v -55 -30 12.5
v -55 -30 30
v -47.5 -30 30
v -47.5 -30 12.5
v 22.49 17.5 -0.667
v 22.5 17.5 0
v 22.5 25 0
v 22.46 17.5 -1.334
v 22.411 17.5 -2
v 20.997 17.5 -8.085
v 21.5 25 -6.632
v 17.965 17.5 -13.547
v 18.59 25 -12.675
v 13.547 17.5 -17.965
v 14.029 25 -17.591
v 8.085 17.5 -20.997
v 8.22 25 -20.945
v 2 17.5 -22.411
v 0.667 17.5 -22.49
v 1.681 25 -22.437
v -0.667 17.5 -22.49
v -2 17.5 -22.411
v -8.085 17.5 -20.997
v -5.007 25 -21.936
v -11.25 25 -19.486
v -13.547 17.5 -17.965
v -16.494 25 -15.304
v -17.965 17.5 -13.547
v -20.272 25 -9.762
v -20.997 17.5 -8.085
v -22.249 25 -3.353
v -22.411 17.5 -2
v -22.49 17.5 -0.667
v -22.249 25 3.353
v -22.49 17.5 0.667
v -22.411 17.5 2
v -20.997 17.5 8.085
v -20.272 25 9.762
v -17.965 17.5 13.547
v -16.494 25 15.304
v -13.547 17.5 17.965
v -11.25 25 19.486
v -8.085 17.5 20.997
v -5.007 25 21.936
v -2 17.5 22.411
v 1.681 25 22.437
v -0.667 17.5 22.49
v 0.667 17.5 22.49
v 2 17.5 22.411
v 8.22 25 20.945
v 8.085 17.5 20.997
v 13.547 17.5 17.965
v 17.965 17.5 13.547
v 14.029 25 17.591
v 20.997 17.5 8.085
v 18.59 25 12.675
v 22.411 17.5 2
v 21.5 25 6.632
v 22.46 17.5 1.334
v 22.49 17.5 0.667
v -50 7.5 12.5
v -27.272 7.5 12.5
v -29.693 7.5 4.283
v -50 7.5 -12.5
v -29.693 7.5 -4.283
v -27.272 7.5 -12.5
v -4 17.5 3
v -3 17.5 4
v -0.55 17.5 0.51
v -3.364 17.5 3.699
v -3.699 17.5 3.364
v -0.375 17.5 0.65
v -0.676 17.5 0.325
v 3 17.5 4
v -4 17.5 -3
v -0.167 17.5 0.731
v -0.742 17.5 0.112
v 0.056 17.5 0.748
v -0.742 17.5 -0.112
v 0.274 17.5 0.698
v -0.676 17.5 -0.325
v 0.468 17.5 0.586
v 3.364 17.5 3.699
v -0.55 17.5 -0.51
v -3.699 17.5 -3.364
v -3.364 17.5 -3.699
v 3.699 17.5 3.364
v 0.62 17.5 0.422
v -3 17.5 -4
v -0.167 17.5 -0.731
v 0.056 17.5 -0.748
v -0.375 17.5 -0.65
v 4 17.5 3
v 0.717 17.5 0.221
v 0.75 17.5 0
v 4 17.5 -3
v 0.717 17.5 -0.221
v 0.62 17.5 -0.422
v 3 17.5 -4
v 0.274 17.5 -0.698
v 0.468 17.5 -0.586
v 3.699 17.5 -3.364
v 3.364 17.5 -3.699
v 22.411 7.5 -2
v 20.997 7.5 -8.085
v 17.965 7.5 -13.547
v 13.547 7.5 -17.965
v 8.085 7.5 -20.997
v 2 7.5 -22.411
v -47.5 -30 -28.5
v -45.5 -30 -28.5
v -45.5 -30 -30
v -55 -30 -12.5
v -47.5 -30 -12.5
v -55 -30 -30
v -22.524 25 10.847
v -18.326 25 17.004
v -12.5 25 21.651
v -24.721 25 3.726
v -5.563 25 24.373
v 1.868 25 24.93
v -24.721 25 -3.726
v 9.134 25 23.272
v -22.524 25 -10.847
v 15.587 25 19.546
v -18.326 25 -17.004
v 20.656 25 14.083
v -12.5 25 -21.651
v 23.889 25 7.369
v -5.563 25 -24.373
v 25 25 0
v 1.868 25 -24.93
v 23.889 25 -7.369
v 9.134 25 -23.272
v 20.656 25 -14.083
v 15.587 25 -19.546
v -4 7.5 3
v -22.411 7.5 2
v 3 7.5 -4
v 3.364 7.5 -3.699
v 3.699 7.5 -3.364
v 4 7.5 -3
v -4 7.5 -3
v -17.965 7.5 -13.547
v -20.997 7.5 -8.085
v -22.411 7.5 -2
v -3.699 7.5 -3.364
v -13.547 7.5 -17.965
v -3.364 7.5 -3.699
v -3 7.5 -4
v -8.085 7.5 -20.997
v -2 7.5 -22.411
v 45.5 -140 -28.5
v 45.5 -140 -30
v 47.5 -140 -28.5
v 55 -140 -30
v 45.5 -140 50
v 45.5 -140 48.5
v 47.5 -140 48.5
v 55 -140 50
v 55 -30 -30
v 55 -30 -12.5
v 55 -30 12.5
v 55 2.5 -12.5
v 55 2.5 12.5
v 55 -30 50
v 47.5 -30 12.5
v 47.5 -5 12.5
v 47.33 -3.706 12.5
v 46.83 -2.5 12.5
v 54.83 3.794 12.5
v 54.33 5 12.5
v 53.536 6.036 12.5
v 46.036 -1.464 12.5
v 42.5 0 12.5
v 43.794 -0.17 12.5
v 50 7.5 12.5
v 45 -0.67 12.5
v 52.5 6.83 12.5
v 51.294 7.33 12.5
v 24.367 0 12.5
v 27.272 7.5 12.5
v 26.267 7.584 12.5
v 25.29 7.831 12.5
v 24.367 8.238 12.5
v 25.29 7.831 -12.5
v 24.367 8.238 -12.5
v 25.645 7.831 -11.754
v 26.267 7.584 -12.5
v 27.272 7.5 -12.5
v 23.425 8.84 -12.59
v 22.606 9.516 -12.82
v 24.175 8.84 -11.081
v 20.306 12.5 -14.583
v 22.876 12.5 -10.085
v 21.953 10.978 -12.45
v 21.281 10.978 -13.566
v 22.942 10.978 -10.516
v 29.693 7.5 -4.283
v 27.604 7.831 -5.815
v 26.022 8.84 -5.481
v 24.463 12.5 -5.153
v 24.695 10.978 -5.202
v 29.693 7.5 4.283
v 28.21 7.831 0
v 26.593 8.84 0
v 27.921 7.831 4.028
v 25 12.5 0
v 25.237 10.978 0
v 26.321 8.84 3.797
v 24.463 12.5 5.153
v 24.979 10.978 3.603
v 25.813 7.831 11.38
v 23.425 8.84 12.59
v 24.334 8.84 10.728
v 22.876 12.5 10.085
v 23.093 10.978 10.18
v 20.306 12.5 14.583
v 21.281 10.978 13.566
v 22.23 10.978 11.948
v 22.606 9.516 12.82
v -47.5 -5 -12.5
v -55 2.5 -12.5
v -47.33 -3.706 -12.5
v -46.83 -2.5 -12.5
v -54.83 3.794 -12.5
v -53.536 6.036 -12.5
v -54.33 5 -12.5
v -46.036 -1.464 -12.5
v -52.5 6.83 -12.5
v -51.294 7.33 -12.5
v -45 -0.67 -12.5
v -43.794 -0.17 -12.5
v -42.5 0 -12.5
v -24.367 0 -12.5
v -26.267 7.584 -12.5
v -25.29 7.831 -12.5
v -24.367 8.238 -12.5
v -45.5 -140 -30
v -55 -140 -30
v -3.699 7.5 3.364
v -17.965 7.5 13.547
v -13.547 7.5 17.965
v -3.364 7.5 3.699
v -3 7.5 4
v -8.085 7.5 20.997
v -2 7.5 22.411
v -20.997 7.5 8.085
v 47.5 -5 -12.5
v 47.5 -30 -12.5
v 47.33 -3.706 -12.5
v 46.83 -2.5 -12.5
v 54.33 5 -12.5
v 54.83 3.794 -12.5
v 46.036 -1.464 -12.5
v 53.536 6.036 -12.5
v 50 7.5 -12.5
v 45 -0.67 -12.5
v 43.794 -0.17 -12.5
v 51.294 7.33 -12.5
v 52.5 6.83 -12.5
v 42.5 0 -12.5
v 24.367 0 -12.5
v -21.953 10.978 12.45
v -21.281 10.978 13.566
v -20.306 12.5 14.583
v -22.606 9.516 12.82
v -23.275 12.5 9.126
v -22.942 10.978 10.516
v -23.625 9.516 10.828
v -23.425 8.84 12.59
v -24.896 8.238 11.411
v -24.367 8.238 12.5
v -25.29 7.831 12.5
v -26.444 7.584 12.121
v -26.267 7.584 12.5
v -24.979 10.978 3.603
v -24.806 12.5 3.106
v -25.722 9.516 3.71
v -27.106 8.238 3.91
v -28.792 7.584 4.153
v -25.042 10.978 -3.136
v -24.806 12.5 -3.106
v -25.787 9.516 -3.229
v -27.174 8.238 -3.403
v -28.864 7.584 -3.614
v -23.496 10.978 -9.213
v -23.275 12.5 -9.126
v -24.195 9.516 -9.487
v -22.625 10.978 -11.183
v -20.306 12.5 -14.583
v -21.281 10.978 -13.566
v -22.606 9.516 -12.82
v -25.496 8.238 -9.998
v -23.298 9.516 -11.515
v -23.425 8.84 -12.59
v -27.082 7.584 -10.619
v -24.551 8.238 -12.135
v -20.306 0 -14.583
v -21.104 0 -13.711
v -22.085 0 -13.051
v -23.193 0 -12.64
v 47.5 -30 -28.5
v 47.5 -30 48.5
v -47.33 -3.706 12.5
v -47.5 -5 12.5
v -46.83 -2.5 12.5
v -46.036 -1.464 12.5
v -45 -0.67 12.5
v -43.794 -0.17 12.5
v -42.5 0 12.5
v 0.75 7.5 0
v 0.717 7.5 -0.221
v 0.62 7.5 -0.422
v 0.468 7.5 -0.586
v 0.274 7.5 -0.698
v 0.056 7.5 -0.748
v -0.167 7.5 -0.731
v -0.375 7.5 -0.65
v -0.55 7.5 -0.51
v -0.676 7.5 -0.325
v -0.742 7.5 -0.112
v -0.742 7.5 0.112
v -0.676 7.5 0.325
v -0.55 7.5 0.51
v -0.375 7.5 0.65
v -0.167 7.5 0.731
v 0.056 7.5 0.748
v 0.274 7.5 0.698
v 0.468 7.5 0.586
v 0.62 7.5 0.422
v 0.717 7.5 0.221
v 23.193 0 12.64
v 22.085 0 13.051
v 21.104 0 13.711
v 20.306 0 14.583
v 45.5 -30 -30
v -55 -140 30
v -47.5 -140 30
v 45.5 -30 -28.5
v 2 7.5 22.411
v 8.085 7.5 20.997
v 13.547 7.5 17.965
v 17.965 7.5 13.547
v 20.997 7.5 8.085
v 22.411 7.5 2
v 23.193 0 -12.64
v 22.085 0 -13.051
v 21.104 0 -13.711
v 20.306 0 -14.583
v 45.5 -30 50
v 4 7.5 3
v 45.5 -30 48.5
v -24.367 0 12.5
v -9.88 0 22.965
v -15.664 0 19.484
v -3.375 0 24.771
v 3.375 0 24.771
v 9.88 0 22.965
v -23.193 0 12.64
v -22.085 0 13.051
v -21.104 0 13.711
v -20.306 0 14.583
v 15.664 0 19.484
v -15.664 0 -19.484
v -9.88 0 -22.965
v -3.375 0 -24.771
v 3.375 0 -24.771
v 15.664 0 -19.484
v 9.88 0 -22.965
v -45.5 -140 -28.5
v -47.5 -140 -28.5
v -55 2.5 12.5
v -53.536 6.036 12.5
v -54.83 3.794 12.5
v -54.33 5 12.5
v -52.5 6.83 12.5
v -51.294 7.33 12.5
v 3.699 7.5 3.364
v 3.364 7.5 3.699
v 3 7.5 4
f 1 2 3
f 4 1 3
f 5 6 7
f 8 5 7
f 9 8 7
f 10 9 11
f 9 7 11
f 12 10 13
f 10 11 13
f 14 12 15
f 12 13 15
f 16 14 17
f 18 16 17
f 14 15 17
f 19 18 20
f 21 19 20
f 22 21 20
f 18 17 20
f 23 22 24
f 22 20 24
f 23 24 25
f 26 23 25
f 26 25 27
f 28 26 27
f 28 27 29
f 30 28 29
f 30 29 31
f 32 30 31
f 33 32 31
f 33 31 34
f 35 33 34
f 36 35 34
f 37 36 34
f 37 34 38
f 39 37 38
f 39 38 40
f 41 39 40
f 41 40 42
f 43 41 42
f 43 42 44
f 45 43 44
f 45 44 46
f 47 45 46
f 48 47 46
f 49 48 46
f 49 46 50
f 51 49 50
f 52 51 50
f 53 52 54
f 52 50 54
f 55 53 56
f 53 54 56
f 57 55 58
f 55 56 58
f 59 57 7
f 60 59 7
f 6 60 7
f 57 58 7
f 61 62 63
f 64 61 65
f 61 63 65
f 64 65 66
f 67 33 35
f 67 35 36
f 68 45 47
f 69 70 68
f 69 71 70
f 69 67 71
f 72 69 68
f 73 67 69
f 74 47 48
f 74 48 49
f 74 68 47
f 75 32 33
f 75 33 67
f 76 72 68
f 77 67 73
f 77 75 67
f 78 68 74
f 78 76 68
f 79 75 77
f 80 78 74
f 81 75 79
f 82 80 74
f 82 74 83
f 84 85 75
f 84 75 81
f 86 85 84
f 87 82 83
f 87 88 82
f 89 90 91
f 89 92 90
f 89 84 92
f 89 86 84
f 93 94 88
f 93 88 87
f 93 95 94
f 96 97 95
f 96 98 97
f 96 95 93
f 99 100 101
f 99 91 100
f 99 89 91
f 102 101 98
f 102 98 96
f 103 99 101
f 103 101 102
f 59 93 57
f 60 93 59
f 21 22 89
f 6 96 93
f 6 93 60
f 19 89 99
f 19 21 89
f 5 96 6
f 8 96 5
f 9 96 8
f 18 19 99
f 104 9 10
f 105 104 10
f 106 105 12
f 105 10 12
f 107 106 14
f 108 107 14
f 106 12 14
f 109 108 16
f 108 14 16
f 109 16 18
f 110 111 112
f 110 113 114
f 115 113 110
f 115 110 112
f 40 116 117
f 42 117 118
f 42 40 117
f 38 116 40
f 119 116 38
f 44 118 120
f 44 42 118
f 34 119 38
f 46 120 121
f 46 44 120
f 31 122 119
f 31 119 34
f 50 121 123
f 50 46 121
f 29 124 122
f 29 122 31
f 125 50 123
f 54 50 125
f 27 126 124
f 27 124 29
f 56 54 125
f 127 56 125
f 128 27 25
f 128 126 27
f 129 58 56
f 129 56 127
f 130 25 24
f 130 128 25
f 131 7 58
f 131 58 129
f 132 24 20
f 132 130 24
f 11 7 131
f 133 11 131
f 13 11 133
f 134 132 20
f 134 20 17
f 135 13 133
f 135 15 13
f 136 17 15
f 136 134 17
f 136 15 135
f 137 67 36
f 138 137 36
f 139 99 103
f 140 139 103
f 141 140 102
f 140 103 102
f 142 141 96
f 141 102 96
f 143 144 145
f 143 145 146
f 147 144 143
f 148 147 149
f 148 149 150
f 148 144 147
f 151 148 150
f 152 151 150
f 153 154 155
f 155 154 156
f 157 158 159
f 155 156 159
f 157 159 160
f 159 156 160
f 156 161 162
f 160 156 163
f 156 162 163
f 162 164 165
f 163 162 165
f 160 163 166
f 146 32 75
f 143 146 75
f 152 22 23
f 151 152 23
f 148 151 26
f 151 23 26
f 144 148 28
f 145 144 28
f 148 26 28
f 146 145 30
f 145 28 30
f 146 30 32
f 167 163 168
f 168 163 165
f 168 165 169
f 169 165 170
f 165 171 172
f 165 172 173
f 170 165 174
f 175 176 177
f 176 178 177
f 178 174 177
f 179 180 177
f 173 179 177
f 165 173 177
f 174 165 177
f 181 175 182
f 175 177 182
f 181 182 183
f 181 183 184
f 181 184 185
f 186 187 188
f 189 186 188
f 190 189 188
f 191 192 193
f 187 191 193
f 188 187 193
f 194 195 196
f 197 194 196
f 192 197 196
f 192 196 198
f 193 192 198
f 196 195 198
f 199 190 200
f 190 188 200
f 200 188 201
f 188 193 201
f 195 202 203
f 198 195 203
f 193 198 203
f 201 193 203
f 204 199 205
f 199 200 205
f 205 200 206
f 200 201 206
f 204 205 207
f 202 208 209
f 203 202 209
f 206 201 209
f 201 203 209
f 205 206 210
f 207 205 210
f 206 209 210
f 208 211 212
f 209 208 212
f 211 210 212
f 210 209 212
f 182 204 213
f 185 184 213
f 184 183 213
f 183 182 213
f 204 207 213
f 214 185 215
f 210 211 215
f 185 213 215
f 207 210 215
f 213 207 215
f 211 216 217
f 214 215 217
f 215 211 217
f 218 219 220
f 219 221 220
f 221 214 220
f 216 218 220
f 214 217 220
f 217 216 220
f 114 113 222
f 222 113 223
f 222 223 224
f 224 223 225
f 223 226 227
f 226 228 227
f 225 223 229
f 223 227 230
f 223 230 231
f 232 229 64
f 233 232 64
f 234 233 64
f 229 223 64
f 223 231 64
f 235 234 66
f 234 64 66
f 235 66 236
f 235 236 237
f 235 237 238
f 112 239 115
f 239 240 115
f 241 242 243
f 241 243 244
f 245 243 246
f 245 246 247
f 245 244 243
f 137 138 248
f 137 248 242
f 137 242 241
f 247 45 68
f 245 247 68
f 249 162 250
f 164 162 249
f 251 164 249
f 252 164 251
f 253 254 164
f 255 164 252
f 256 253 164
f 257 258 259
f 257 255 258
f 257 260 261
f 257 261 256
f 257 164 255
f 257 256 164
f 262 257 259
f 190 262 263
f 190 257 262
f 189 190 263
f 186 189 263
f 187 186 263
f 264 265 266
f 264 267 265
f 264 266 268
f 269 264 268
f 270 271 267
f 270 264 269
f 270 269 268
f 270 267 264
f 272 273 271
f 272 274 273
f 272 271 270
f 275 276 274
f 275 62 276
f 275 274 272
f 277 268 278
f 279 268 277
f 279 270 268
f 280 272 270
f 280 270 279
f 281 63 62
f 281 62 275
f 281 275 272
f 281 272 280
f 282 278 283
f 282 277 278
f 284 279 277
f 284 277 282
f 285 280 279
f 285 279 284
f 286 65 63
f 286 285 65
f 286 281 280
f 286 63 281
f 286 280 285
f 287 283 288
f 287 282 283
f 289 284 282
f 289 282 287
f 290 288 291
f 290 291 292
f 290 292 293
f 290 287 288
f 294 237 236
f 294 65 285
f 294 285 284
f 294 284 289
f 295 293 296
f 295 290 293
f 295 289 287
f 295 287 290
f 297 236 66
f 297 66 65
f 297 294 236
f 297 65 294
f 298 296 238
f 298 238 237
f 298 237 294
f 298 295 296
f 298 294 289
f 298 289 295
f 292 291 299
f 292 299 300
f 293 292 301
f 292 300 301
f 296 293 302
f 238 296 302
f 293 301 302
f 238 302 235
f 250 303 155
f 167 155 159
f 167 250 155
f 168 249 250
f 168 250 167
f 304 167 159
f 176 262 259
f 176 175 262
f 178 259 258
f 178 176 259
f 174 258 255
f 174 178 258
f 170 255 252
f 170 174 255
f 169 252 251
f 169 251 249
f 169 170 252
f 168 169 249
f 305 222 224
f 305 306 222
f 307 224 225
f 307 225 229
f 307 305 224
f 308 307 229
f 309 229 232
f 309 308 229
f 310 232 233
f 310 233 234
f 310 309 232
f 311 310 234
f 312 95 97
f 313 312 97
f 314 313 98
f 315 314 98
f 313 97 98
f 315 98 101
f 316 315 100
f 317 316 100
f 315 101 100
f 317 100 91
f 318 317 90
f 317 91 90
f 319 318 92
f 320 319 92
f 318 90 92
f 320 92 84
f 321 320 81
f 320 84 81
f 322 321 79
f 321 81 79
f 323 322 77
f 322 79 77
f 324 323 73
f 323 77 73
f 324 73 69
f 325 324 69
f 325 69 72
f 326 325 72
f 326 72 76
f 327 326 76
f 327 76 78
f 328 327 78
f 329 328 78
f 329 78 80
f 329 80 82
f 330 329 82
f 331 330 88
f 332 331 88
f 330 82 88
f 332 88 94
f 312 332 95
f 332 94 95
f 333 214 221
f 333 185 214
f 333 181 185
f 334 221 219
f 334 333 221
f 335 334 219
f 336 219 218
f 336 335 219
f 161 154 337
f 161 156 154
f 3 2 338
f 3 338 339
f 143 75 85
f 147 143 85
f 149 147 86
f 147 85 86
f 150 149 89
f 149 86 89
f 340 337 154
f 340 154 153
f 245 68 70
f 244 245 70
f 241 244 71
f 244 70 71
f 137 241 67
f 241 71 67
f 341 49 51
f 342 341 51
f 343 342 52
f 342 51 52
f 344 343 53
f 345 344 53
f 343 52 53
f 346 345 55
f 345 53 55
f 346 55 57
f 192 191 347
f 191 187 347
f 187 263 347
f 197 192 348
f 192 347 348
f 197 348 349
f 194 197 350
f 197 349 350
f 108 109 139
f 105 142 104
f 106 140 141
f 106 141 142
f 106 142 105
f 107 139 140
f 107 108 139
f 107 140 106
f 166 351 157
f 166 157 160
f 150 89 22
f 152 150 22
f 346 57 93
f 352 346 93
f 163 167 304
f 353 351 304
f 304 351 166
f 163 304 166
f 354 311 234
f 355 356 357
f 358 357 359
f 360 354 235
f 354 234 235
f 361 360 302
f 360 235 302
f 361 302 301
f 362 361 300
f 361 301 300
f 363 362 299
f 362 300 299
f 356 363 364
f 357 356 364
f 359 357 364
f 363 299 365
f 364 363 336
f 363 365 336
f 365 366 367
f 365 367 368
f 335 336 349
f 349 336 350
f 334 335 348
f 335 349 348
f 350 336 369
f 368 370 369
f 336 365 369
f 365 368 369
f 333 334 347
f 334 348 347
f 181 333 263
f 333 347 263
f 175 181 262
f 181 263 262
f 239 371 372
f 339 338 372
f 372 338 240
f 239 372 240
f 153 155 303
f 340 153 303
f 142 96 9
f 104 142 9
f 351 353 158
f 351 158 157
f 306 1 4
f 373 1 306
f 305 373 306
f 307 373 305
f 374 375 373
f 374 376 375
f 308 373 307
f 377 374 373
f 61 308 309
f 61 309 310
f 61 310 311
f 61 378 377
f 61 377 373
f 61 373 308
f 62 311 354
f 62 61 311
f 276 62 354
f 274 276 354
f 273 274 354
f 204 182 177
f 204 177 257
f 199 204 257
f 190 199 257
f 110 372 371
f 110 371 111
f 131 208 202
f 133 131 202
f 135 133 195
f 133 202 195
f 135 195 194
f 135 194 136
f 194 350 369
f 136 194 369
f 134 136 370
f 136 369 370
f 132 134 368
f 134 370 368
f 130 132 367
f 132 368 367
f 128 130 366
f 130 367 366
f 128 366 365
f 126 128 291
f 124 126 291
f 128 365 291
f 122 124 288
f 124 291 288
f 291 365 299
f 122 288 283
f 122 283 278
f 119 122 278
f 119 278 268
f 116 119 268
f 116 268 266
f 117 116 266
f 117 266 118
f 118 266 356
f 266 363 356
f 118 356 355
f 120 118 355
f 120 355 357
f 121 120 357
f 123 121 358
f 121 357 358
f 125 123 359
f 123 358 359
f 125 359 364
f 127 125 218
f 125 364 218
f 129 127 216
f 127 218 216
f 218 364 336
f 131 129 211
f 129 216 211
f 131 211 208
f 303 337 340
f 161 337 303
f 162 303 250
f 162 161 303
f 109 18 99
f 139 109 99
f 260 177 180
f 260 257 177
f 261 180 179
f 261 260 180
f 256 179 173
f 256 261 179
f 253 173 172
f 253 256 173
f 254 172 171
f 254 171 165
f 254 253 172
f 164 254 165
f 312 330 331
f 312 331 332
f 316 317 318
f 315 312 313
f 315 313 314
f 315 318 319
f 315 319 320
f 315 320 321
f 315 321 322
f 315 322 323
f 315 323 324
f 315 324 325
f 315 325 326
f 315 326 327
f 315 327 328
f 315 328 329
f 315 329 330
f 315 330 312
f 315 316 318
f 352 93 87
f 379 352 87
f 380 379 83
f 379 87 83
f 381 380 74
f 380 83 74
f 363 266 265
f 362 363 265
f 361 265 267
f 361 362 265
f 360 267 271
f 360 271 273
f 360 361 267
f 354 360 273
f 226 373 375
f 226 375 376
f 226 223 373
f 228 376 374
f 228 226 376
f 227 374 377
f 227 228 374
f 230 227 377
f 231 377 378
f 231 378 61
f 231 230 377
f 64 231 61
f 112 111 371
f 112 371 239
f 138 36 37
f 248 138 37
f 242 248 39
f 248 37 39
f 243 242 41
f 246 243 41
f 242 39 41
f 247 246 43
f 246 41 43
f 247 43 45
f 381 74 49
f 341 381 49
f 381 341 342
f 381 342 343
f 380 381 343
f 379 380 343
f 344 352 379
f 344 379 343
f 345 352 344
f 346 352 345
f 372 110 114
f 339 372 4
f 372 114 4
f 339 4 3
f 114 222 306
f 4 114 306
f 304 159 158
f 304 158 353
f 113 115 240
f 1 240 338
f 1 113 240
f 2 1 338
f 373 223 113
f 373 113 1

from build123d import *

# Parameters (mm, degrees)
SKETCH1_R                = 25
BOSS_EXTRUDE1_DEPTH      = 25
BOSS_EXTRUDE3_DEPTH      = 55
BOSS_EXTRUDE3_DEPTH_BACK = 55
SKETCH9_W                = 25
SKETCH9_H                = 7.5
SKETCH16_R               = 22.5
CUT_EXTRUDE3_DEPTH       = 7.5
SKETCH17_R               = 0.75
CUT_EXTRUDE4_DEPTH       = 10
SKETCH22_W               = 7.5
SKETCH22_H               = 25
BOSS_EXTRUDE7_DEPTH      = 30
SKETCH23_W               = 7.5
SKETCH23_H               = 60
BOSS_EXTRUDE8_DEPTH      = 110
SKETCH24_W               = 7.5
SKETCH24_H               = 80
BOSS_EXTRUDE9_DEPTH      = 110
SKETCH25_W               = 1.5
SKETCH25_H               = 110
BOSS_EXTRUDE10_DEPTH     = 2
SKETCH26_W               = 1.5
SKETCH26_H               = 110
BOSS_EXTRUDE11_DEPTH     = 2
FILLET6_R                = 5


with BuildPart() as part:
    # Sketch1 → Boss-Extrude1 (new body)
    with BuildSketch(Plane(origin=(0, 0, 0), x_dir=(1, 0, 0), z_dir=(0, 1, 0))):
        Circle(SKETCH1_R)
    extrude(amount=BOSS_EXTRUDE1_DEPTH)

    # Sketch9 → Boss-Extrude3 (add, two sides: drawn at the far end of the back side and taken through both)
    with BuildSketch(Plane(origin=(0, 0, 0), x_dir=(0, 0, -1), z_dir=(1, 0, 0)).offset(-BOSS_EXTRUDE3_DEPTH_BACK)):
        with Locations((0, 3.75)):
            Rectangle(SKETCH9_W, SKETCH9_H)
    extrude(amount=BOSS_EXTRUDE3_DEPTH + BOSS_EXTRUDE3_DEPTH_BACK)

    # Sketch16 → Cut-Extrude3 (cut)
    with BuildSketch(Plane(origin=(0, 25, 0), x_dir=(1, 0, 0), z_dir=(0, 1, 0))):
        Circle(SKETCH16_R)
    extrude(amount=-CUT_EXTRUDE3_DEPTH, mode=Mode.SUBTRACT)

    # Sketch17 → Cut-Extrude4 (cut)
    with BuildSketch(Plane(origin=(0, 17.5, 0), x_dir=(1, 0, 0), z_dir=(0, 1, 0))):
        with BuildLine():
            ThreePointArc((-4, 3), (-3.535533906, 3.535533906), (-3, 4))
            Line((-3, 4), (-2, 22.410934831))
            ThreePointArc((-2, 22.410934831), (-15.909902577, 15.909902577), (-22.410934831, 2))
            Line((-22.410934831, 2), (-4, 3))
        make_face()
        Circle(SKETCH17_R)
        with BuildLine():
            ThreePointArc((22.410934831, 2), (15.909902577, 15.909902577), (2, 22.410934831))
            Line((2, 22.410934831), (3, 4))
            ThreePointArc((3, 4), (3.535533906, 3.535533906), (4, 3))
            Line((4, 3), (22.410934831, 2))
        make_face()
        with BuildLine():
            ThreePointArc((-3, -4), (-3.535533906, -3.535533906), (-4, -3))
            Line((-4, -3), (-22.410934831, -2))
            ThreePointArc((-22.410934831, -2), (-15.909902577, -15.909902577), (-2, -22.410934831))
            Line((-2, -22.410934831), (-3, -4))
        make_face()
        with BuildLine():
            ThreePointArc((4, -3), (3.535533906, -3.535533906), (3, -4))
            Line((3, -4), (2, -22.410934831))
            ThreePointArc((2, -22.410934831), (15.909902577, -15.909902577), (22.410934831, -2))
            Line((22.410934831, -2), (4, -3))
        make_face()
    extrude(amount=-CUT_EXTRUDE4_DEPTH, mode=Mode.SUBTRACT)

    # Sketch22 → Boss-Extrude7 (add)
    with BuildSketch(Plane.XZ):
        with Locations((-51.25, 0)):
            Rectangle(SKETCH22_W, SKETCH22_H)
    boss_extrude7 = extrude(amount=BOSS_EXTRUDE7_DEPTH)

    # Sketch23 → Boss-Extrude8 (add)
    with BuildSketch(Plane.XZ.offset(30)):
        with Locations((-51.25, 0)):
            Rectangle(SKETCH23_W, SKETCH23_H)
    extrude(amount=BOSS_EXTRUDE8_DEPTH)

    # Mirror1: Boss-Extrude7 across plane
    add(boss_extrude7.mirror(Plane(origin=(0, 0, 0), x_dir=(0, 0, 1), z_dir=(1, 0, 0))))

    # Sketch24 → Boss-Extrude9 (add)
    with BuildSketch(Plane.XZ.offset(30)):
        with Locations((51.25, 10)):
            Rectangle(SKETCH24_W, SKETCH24_H)
    extrude(amount=BOSS_EXTRUDE9_DEPTH)

    # Sketch25 → Boss-Extrude10 (add)
    with BuildSketch(Plane(origin=(-47.5, 0, 0), x_dir=(0, 0, -1), z_dir=(1, 0, 0))):
        with Locations((29.25, -85)):
            Rectangle(SKETCH25_W, SKETCH25_H)
    extrude(amount=BOSS_EXTRUDE10_DEPTH)

    # Sketch26 → Boss-Extrude11 (add)
    with BuildSketch(Plane.ZY.offset(-47.5)):
        with Locations((-29.25, -85)):
            Rectangle(SKETCH26_W, SKETCH26_H)
        with Locations((49.25, -85)):
            Rectangle(SKETCH26_W, SKETCH26_H)
    extrude(amount=BOSS_EXTRUDE11_DEPTH)

    # Fillet6
    fillet6_edges = [part.edges().sort_by_distance(p)[0] for p in [
        (55, 7.5, 0),
        (-55, 7.5, 0),
        (-47.5, 0, 0),
        (47.5, 0, 0),
        (24.148145657, 7.5, -6.470476128),
        (-25, 7.5, 0),
        (-21.650635095, 3.75, 12.5),
        (21.650635095, 3.75, 12.5),
        (-21.650635095, 3.75, -12.5),
        (21.650635095, 3.75, -12.5),
    ]]
    fillet(fillet6_edges, radius=FILLET6_R)


solid = part.part
